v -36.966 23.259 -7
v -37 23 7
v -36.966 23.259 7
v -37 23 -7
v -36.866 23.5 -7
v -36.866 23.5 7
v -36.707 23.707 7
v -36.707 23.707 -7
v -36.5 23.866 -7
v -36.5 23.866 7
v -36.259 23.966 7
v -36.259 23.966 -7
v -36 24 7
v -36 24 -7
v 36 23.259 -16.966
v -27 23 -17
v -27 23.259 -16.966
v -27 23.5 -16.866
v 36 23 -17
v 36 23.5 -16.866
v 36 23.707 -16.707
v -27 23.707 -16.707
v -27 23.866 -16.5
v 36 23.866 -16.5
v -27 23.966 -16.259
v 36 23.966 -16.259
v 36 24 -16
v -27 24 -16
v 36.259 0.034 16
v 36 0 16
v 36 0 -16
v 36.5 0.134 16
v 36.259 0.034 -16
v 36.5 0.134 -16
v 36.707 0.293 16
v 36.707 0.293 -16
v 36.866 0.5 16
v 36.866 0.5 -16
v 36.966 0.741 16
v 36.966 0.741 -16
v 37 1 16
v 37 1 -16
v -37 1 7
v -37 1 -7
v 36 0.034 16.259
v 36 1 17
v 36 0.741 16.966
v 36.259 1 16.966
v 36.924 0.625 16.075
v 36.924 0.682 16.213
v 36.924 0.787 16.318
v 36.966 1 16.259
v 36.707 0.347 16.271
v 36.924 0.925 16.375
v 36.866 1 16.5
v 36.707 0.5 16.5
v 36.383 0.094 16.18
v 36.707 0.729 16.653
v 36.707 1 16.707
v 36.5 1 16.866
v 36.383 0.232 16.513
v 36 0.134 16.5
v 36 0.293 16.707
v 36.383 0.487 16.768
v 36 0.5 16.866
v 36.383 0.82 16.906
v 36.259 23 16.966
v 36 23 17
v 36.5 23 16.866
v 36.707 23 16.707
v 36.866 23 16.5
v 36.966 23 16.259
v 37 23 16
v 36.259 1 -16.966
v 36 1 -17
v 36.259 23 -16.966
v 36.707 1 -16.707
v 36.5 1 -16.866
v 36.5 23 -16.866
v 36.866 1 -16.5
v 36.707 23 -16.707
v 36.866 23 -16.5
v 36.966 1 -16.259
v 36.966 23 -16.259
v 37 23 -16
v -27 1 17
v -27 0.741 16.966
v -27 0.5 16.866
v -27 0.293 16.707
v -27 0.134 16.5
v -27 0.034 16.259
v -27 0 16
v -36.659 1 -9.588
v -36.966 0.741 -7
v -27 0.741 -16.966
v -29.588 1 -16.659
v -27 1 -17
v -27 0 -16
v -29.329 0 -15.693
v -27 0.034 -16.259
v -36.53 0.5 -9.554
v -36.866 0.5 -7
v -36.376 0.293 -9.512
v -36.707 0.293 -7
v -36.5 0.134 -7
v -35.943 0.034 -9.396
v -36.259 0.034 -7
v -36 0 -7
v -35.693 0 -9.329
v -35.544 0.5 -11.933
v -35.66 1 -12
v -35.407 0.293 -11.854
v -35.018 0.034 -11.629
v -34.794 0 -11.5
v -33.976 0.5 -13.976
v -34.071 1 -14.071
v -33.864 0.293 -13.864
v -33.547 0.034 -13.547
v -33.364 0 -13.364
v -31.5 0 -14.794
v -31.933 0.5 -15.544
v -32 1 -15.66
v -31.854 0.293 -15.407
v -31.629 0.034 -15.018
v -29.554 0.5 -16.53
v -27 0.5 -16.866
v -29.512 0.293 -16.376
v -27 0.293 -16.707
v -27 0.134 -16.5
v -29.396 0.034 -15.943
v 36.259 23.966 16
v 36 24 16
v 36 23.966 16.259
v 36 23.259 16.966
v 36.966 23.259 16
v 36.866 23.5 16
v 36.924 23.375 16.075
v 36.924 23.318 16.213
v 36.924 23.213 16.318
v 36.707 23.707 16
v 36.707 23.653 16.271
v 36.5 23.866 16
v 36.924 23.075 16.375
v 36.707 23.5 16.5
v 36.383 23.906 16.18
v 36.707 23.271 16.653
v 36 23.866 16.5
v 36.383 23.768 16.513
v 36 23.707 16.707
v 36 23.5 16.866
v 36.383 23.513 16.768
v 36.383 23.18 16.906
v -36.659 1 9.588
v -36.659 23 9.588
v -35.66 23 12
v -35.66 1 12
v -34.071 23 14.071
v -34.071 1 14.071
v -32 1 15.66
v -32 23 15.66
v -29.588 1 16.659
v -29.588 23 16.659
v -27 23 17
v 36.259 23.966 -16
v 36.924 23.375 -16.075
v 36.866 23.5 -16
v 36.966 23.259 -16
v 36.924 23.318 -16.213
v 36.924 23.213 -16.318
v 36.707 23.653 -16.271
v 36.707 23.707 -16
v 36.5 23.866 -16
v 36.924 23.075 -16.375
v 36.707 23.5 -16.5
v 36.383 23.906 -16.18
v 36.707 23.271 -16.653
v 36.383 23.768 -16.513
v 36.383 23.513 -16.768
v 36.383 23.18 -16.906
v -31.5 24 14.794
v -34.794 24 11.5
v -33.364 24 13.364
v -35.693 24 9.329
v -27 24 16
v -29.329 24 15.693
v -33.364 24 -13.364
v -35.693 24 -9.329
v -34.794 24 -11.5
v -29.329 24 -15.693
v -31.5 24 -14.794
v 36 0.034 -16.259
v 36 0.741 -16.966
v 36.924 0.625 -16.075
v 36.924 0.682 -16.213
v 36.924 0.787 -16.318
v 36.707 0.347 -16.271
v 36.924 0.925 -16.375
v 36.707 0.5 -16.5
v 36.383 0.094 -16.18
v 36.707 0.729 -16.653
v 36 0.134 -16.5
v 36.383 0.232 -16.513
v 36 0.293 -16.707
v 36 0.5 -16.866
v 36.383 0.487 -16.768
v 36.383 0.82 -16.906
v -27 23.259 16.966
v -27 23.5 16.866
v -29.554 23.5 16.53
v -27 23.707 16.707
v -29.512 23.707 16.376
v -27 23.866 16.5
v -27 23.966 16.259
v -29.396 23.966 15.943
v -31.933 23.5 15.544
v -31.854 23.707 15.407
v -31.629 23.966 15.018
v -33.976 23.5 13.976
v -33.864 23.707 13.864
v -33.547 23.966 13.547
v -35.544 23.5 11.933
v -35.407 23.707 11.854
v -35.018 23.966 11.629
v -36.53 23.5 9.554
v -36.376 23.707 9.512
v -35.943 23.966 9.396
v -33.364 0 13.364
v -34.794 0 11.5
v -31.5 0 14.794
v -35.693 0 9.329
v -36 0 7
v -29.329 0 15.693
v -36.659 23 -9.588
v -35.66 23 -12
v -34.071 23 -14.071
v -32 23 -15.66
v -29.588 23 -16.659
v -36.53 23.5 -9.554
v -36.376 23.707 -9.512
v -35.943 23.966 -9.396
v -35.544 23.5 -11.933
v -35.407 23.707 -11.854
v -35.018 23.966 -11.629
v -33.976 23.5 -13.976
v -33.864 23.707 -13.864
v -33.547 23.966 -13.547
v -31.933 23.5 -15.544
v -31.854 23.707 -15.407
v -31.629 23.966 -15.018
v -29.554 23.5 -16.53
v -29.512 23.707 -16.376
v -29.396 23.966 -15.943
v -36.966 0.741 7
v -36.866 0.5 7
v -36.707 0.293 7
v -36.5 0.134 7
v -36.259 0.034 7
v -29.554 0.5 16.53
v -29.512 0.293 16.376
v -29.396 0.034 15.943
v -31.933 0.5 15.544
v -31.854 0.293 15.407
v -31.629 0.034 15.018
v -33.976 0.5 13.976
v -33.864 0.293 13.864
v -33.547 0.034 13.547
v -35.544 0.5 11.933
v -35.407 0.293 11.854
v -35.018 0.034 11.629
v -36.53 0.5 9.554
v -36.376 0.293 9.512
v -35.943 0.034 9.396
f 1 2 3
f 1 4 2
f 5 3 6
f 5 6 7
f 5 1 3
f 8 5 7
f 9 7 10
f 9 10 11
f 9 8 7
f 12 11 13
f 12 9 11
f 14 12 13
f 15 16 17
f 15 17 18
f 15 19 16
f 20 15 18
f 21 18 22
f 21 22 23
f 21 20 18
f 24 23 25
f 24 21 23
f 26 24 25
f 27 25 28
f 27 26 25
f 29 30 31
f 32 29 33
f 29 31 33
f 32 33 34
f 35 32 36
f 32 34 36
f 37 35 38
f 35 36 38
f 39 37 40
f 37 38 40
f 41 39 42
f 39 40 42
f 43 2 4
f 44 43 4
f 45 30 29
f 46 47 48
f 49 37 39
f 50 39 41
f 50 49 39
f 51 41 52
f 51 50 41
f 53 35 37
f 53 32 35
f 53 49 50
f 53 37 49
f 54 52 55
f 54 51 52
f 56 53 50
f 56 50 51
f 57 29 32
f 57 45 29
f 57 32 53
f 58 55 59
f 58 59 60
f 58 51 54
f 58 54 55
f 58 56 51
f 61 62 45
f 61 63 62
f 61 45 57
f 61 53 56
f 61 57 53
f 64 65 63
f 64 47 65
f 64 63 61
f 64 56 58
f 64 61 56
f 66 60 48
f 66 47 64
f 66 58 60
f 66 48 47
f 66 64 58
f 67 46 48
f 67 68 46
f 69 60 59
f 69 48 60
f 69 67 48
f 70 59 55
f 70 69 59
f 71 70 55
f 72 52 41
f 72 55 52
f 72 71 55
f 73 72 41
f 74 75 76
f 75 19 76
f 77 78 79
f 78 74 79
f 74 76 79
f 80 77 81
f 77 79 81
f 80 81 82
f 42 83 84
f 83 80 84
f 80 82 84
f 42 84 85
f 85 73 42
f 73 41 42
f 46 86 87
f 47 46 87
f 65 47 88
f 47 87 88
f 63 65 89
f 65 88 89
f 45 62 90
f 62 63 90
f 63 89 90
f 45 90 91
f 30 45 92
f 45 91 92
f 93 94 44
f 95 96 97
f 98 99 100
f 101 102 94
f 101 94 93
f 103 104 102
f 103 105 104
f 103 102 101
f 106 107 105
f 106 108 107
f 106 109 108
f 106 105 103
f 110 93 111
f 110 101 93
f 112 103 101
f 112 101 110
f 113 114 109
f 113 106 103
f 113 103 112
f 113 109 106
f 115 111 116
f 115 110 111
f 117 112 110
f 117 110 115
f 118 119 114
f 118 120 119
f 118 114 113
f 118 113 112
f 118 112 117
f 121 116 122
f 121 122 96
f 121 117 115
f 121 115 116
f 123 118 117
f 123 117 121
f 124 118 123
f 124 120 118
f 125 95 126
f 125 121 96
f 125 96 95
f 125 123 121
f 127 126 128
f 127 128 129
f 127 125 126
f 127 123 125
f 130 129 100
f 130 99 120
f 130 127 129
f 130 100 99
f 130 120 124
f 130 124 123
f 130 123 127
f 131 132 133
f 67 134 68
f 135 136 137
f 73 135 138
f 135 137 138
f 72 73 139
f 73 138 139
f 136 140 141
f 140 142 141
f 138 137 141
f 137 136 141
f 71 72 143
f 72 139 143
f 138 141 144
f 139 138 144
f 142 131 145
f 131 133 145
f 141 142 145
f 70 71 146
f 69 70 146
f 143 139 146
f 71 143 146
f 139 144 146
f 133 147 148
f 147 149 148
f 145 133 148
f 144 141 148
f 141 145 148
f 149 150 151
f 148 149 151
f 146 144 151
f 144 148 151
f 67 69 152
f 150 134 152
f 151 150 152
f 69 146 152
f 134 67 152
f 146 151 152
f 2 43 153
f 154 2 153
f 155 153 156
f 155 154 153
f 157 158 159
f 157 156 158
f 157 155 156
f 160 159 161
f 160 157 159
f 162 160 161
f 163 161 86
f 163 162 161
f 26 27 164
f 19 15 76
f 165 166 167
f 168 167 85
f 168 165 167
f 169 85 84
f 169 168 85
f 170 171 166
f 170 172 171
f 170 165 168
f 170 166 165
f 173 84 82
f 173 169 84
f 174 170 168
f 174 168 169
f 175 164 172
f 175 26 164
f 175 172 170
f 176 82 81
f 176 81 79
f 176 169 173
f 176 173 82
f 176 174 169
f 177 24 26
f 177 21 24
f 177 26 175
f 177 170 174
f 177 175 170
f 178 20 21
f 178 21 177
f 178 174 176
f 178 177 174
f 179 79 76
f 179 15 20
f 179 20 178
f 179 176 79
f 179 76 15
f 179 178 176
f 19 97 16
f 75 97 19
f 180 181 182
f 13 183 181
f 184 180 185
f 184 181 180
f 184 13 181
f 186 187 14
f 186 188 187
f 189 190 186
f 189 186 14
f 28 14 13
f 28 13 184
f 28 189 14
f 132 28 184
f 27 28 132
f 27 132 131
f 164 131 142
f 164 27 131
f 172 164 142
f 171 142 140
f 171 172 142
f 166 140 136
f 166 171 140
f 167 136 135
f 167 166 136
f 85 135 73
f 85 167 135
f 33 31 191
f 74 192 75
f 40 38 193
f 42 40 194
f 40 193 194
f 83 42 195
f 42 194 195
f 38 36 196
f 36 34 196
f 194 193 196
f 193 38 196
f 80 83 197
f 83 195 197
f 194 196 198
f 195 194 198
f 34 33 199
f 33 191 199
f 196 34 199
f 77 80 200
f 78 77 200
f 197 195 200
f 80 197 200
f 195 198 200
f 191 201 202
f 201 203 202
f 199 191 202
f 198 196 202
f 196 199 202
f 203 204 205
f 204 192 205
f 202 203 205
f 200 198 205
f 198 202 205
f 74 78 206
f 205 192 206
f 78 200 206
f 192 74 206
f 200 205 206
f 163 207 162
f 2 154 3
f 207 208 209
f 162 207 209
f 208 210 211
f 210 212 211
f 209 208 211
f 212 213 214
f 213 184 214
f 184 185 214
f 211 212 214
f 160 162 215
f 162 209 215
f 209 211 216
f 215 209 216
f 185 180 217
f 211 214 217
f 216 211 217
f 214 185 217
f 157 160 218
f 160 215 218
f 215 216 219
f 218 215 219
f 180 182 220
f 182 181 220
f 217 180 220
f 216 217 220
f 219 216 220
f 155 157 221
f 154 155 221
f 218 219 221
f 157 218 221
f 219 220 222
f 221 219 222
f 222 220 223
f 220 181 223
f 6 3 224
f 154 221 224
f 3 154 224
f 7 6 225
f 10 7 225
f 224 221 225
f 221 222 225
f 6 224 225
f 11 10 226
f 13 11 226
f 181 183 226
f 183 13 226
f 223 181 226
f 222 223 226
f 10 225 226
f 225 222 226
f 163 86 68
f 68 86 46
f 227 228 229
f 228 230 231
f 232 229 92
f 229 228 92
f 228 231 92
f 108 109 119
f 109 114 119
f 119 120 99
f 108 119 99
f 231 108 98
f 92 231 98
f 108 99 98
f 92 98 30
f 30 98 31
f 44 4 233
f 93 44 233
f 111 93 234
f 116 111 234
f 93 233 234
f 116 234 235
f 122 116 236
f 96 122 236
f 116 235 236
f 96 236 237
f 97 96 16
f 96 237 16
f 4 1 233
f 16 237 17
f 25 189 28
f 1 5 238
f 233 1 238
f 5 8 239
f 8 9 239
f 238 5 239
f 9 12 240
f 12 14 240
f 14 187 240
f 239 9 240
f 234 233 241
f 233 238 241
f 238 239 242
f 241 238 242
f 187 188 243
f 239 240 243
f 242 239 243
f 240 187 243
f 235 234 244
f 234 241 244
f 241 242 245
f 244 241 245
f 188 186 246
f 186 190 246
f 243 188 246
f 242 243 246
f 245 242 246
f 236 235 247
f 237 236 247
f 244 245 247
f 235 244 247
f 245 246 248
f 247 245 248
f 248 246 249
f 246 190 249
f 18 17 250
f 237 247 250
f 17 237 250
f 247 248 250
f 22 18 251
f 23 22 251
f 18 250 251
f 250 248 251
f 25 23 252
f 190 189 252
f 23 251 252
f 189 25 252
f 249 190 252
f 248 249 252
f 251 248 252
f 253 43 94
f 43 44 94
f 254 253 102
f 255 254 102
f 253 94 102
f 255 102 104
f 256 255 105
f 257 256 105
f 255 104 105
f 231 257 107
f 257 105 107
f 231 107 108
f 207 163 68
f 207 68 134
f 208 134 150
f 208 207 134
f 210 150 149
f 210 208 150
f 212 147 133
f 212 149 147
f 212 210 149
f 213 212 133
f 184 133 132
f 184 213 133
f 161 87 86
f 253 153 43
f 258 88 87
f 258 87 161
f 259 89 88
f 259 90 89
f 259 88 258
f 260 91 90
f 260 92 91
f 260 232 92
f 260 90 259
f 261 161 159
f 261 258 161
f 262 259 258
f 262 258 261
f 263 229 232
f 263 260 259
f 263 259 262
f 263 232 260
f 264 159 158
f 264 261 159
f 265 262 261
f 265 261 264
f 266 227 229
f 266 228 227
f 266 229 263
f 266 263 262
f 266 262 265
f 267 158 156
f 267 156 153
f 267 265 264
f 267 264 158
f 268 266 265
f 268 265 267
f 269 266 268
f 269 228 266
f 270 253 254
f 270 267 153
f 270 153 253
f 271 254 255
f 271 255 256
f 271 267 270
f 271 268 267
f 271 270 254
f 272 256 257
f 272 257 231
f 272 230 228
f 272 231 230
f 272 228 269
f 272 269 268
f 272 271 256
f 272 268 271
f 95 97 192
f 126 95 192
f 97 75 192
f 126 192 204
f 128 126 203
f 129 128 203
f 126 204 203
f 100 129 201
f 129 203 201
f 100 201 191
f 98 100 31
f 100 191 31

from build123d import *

# Parameters (mm, degrees)
SKETCH1_W           = 74
SKETCH1_H           = 34
BOSS_EXTRUDE1_DEPTH = 24
FILLET1_R           = 10
FILLET2_R           = 1


with BuildPart() as part:
    # Sketch1 → Boss-Extrude1 (new body)
    with BuildSketch(Plane(origin=(0, 0, 0), x_dir=(1, 0, 0), z_dir=(0, 1, 0))):
        Rectangle(SKETCH1_W, SKETCH1_H)
    extrude(amount=BOSS_EXTRUDE1_DEPTH)

    # Fillet1
    fillet1_edges = [part.edges().sort_by_distance(p)[0] for p in [
        (-37, 12, 17),
        (-37, 12, -17),
    ]]
    fillet(fillet1_edges, radius=FILLET1_R)

    # Fillet2
    fillet2_edges = [part.edges().sort_by_distance(p)[0] for p in [
        (-37, 0, 0),
        (-37, 24, 0),
        (5, 0, 17),
        (-34.071067812, 0, 14.071067812),
        (-34.071067812, 0, -14.071067812),
        (5, 24, 17),
        (-34.071067812, 24, 14.071067812),
        (-34.071067812, 24, -14.071067812),
        (37, 24, 0),
        (5, 0, -17),
        (37, 0, 0),
        (37, 12, 17),
        (37, 12, -17),
        (5, 24, -17),
    ]]
    fillet(fillet2_edges, radius=FILLET2_R)


solid = part.part
